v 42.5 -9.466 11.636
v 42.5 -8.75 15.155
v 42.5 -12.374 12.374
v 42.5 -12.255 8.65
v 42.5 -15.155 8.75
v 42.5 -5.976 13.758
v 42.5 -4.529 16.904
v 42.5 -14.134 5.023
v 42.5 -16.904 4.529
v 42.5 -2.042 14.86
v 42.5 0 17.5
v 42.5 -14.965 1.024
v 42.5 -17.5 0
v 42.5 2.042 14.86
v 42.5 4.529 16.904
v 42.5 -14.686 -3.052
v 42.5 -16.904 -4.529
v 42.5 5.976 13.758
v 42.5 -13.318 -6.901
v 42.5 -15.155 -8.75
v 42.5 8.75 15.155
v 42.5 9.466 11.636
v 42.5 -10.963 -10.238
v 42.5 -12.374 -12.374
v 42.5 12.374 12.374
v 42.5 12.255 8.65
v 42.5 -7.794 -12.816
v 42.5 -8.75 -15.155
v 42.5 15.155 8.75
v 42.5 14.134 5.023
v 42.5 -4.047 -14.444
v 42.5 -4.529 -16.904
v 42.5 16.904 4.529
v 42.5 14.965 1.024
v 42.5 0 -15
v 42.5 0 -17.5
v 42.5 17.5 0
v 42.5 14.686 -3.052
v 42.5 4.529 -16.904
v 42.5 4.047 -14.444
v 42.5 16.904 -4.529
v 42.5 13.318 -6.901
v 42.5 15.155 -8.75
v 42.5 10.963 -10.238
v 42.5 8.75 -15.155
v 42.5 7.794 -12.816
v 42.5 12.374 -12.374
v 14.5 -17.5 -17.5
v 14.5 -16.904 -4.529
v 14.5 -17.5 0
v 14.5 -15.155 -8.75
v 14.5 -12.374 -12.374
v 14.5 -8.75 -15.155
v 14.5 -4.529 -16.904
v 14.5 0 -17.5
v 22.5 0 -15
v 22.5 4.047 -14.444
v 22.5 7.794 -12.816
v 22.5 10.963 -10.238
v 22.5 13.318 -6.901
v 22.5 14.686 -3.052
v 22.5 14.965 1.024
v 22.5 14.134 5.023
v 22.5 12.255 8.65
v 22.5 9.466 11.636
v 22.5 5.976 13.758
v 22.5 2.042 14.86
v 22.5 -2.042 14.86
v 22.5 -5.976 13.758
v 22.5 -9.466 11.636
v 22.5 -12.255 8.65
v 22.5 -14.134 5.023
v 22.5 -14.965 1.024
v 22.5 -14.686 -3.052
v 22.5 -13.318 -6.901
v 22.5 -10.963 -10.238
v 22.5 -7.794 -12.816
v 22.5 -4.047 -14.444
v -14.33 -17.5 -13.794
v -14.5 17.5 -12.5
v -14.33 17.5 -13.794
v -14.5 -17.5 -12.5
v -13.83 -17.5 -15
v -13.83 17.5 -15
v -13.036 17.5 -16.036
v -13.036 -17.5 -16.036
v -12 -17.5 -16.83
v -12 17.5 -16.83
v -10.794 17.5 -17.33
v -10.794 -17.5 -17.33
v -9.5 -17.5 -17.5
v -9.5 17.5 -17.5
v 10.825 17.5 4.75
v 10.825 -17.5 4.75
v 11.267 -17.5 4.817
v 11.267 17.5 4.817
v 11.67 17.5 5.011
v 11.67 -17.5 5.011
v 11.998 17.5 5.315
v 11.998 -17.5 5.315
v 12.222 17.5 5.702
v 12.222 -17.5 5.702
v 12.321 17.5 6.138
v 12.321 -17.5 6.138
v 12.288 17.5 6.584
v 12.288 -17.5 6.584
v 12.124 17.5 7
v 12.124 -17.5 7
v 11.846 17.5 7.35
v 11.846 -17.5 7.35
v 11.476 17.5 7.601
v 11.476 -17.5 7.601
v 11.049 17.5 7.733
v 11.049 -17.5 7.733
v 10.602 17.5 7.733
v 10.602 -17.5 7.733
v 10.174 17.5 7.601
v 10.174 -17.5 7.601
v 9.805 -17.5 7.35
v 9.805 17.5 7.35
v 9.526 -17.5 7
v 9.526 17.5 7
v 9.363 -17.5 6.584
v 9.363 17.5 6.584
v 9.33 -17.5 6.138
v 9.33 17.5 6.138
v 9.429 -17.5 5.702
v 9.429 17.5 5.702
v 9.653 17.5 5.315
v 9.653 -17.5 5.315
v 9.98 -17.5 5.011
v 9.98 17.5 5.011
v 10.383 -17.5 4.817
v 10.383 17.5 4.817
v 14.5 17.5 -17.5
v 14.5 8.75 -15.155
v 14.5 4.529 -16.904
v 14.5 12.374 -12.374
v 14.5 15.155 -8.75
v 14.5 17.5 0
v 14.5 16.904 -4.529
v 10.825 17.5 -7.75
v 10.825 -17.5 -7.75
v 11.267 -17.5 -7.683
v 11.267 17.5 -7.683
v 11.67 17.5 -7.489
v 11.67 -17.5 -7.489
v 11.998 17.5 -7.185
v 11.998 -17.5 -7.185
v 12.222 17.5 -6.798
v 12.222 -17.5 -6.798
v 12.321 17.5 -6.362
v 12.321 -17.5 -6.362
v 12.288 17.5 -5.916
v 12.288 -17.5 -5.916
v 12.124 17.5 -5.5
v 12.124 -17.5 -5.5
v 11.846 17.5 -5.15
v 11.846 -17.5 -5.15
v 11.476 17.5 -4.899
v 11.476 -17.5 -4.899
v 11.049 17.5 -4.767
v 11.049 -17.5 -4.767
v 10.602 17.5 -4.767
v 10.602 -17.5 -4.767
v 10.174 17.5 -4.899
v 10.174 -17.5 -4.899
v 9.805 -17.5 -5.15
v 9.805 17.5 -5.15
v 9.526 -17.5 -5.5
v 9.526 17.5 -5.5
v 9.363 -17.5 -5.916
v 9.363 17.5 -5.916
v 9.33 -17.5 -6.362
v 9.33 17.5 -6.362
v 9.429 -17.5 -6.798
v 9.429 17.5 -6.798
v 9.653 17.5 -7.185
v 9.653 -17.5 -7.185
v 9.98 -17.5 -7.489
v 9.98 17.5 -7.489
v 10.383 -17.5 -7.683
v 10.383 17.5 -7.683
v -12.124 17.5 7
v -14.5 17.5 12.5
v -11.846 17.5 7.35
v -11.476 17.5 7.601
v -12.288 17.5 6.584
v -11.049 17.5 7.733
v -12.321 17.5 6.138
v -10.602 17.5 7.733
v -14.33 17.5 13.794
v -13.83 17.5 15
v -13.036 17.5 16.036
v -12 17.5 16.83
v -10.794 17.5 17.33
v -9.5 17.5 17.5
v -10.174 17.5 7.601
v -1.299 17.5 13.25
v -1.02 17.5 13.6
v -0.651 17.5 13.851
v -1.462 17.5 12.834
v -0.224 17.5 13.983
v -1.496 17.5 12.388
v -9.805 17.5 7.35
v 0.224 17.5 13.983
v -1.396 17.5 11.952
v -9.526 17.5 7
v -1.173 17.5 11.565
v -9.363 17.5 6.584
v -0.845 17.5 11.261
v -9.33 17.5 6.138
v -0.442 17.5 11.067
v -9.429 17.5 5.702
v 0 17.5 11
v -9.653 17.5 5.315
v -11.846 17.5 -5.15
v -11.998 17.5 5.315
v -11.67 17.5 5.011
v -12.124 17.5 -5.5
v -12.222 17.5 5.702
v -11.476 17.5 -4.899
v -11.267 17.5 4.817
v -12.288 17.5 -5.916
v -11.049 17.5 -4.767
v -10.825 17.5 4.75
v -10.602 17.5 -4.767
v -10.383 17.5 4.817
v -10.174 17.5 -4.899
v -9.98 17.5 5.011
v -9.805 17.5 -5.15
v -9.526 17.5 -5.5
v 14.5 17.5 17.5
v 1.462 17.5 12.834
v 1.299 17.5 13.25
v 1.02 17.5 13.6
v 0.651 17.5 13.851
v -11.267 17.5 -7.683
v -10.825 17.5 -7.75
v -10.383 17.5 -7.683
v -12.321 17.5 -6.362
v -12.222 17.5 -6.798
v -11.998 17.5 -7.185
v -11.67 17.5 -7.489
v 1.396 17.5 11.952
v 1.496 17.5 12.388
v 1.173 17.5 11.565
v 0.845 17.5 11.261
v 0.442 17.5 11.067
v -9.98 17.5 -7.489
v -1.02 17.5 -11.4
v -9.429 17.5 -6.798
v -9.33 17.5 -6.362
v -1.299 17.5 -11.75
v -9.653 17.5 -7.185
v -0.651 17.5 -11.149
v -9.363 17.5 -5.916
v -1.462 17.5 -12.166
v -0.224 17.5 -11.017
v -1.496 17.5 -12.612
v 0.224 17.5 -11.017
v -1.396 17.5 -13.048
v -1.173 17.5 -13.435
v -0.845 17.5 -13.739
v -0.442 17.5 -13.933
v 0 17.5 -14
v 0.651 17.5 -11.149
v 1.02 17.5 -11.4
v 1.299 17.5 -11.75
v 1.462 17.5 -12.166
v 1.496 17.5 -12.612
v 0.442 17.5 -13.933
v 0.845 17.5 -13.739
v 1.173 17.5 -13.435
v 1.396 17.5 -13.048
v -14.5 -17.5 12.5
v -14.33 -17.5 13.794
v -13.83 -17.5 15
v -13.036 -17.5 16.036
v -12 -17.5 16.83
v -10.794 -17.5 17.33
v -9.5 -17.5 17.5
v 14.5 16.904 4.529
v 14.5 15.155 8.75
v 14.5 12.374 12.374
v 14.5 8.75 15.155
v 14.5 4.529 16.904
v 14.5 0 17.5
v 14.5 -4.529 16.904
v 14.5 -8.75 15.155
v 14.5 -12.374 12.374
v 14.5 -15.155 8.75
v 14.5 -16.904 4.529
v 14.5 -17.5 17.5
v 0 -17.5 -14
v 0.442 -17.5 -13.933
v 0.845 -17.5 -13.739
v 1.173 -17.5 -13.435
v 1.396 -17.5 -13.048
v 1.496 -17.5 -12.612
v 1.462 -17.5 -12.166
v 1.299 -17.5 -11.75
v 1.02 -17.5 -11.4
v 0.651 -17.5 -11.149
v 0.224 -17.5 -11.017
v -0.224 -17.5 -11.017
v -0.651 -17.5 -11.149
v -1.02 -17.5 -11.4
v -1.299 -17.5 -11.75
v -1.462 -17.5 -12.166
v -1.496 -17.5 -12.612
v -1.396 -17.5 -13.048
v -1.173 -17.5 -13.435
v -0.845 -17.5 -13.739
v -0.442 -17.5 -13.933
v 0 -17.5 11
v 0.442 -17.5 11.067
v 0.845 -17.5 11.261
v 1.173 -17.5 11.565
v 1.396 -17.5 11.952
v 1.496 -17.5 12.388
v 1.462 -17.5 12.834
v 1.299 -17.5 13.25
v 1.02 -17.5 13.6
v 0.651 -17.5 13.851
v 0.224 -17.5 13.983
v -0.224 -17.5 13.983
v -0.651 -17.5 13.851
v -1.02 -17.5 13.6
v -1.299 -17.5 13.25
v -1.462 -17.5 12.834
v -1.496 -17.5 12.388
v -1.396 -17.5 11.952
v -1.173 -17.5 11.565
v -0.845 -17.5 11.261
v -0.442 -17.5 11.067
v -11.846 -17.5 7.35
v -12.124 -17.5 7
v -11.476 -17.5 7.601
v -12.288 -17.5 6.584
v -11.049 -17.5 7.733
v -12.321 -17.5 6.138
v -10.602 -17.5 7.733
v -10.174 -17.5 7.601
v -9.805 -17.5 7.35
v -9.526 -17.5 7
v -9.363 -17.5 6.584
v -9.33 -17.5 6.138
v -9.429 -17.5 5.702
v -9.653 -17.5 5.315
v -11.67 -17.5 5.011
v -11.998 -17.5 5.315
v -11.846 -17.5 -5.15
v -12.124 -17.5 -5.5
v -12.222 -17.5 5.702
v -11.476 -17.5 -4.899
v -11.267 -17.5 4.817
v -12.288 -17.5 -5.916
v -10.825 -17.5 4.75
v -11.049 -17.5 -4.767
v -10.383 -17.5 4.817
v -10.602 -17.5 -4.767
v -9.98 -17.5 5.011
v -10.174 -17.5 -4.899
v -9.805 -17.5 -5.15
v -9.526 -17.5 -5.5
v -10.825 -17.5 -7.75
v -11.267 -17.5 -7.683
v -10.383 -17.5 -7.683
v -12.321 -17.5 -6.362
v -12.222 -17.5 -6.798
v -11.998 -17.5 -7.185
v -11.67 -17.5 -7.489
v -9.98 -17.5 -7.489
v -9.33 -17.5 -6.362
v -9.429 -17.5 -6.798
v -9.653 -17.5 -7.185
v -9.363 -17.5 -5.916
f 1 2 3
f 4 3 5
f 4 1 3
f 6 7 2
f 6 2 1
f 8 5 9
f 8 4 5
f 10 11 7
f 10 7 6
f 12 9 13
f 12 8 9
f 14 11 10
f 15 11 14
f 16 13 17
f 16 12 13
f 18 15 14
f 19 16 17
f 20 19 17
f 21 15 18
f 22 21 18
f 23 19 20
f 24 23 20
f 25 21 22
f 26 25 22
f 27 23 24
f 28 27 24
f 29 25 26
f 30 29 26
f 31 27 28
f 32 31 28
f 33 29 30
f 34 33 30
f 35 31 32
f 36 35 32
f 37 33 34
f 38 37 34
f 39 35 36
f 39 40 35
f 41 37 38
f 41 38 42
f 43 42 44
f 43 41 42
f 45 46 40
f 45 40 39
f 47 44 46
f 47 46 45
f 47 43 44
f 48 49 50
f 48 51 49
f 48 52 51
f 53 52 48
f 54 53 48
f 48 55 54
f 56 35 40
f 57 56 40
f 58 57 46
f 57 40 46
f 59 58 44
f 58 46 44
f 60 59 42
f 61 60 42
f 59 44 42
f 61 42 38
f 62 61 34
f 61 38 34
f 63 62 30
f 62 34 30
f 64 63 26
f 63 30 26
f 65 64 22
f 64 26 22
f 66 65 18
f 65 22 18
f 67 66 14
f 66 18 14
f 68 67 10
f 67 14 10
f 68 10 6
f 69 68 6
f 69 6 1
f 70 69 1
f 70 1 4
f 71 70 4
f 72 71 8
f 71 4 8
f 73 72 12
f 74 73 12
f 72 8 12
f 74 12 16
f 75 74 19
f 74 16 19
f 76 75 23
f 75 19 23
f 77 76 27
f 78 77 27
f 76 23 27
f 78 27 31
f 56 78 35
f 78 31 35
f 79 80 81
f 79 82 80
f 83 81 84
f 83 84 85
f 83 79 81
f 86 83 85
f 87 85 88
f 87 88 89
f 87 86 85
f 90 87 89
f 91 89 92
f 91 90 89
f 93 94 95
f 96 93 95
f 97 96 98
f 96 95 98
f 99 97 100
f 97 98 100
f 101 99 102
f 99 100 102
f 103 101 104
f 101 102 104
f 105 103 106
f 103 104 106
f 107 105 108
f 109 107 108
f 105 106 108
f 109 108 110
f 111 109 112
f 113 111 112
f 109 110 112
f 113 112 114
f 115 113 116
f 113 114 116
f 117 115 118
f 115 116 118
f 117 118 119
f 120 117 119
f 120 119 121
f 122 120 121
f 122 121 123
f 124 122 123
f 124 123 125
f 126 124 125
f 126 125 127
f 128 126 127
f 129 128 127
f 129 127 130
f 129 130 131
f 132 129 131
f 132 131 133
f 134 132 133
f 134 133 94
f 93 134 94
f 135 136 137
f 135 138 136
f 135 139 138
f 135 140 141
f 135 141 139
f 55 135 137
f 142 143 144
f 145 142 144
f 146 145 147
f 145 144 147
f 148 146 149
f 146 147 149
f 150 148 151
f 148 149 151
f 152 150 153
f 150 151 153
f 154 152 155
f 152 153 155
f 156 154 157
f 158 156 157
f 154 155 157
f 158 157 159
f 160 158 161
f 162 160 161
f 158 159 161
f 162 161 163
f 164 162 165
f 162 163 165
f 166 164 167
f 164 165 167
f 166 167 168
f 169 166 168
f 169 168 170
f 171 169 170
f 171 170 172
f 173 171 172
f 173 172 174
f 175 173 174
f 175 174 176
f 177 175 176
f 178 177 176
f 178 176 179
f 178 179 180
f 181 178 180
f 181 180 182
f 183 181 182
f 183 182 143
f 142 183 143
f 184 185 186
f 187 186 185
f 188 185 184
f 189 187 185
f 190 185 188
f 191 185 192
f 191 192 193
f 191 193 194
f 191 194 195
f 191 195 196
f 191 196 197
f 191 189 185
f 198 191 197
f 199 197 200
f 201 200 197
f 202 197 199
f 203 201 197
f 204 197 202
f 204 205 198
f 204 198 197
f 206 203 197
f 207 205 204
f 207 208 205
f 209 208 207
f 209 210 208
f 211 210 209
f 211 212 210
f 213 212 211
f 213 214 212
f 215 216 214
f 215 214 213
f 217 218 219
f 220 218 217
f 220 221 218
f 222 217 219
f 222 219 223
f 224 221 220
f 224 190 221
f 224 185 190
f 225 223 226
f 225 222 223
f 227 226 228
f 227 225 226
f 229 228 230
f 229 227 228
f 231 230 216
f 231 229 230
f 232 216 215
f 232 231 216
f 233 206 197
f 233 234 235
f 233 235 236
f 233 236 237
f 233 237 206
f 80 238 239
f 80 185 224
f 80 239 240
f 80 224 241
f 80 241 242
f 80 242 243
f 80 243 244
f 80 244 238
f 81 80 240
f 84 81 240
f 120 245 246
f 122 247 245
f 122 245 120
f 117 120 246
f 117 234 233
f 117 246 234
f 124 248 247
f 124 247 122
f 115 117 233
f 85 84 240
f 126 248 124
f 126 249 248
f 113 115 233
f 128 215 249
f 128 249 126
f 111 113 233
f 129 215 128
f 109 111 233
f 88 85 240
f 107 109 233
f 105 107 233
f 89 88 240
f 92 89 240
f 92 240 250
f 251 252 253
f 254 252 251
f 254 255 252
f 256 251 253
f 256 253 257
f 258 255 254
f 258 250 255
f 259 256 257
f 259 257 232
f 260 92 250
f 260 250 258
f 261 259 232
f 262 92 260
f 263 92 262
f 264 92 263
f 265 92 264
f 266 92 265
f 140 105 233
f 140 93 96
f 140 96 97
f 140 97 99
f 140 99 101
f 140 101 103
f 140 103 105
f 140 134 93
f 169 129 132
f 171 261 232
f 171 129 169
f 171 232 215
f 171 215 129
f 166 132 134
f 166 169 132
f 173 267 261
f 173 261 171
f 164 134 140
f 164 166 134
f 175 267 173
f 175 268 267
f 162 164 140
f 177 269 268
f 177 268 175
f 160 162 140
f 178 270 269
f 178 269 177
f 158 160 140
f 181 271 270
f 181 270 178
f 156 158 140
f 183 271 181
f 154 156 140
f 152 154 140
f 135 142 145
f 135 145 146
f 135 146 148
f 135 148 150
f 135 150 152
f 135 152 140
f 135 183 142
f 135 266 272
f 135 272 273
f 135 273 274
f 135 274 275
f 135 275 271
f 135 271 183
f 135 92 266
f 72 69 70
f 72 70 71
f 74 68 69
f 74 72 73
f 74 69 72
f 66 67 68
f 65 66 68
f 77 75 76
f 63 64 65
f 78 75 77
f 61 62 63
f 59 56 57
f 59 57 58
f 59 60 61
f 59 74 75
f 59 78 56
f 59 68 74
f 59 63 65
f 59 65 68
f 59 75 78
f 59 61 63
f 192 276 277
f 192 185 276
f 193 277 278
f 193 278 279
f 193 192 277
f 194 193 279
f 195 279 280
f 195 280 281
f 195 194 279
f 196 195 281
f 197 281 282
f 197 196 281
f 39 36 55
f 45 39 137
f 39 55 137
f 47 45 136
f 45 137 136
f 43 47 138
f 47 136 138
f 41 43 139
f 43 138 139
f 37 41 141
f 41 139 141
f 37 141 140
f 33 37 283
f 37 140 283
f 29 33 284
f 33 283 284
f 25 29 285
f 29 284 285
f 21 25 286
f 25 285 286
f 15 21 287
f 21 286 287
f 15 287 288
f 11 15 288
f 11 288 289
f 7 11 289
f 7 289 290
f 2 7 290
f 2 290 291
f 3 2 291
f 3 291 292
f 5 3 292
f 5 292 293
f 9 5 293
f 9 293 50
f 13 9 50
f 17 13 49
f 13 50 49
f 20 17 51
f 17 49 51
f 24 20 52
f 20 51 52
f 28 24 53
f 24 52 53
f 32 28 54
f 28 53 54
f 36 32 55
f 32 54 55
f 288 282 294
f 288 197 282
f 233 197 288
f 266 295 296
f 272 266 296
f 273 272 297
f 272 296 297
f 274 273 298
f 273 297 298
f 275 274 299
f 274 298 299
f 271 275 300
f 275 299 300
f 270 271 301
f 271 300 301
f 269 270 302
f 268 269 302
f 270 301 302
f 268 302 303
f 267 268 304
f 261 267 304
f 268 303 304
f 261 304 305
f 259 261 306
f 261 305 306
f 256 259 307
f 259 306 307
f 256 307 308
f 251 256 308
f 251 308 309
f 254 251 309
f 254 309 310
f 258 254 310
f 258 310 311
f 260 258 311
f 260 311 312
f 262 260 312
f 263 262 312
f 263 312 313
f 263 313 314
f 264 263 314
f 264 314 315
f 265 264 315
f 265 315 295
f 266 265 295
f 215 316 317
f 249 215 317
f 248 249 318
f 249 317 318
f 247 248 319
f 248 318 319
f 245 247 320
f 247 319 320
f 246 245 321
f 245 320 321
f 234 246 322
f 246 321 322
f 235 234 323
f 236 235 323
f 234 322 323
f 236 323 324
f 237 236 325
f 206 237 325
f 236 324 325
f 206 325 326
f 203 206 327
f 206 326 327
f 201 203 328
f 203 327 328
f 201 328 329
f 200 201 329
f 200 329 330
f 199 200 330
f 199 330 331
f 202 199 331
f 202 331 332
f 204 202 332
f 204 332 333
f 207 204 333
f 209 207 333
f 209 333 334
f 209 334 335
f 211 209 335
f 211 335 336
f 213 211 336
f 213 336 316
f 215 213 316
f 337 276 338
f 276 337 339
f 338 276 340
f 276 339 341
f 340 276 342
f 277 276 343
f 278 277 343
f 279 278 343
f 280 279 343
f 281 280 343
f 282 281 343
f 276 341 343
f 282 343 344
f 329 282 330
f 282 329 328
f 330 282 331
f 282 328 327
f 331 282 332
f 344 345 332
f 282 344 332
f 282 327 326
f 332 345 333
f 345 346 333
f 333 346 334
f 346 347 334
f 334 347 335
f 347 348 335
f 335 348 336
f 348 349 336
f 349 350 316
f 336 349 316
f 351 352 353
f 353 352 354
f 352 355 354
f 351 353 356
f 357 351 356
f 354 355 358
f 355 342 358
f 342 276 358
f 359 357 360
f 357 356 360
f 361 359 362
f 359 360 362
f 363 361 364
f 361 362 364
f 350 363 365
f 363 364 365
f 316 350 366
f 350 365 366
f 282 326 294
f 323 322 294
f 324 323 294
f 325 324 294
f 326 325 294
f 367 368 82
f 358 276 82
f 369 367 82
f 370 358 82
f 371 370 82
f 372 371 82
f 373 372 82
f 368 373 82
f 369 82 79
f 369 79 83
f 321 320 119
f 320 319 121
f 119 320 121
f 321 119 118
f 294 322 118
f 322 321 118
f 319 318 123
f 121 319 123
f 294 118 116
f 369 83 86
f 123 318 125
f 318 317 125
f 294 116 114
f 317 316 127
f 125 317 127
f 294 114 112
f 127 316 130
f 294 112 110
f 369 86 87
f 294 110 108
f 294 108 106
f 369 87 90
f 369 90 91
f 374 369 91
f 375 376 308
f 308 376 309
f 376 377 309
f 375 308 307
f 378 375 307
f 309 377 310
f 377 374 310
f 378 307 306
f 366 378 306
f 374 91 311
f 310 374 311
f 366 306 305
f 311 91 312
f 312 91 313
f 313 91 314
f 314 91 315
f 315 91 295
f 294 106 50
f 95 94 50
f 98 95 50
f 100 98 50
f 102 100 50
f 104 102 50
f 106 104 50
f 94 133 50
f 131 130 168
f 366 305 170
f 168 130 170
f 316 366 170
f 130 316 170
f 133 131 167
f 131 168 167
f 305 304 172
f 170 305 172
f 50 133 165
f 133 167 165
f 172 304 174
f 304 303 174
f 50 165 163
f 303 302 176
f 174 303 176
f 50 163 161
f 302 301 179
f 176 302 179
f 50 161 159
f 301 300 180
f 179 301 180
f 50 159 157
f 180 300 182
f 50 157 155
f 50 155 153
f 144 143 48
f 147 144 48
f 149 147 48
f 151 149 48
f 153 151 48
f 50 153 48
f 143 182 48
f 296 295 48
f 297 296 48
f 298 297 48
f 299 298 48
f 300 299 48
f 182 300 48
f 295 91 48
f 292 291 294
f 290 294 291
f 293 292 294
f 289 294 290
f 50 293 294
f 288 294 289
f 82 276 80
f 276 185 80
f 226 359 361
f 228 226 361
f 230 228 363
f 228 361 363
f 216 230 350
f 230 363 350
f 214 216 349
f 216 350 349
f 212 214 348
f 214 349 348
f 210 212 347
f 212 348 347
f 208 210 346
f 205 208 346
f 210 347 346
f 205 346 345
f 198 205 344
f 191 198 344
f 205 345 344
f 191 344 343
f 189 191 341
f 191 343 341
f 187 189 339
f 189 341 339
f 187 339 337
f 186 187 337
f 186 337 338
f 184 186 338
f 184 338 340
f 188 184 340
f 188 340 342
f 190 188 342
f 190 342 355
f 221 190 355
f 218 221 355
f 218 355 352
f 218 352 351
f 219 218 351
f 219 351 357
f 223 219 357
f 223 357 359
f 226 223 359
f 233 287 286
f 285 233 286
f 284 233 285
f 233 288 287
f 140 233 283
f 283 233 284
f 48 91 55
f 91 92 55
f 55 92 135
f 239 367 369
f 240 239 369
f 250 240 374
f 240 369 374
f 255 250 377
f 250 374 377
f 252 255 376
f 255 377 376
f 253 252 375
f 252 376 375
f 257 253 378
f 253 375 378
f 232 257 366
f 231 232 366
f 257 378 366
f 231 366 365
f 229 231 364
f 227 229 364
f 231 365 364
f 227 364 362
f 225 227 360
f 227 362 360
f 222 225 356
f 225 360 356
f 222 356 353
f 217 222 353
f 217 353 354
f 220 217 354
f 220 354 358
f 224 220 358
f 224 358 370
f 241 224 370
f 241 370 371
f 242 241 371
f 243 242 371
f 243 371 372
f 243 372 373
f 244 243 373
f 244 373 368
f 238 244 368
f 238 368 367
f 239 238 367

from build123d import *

# Parameters (mm, degrees)
SKETCH1_W           = 29
SKETCH1_H           = 35
BOSS_EXTRUDE1_DEPTH = 17.5
FILLET1_R           = 5
SKETCH2_R           = 17.5
BOSS_EXTRUDE2_DEPTH = 28
SKETCH3_R           = 15
CUT_EXTRUDE1_DEPTH  = 20
CUT_EXTRUDE2_REACH  = 59.771
SKETCH4_R           = 1.5


with BuildPart() as part:
    # Sketch1 → Boss-Extrude1 (new, symmetric)
    with BuildSketch(Plane(origin=(0, 0, 0), x_dir=(1, 0, 0), z_dir=(0, 1, 0))):
        Rectangle(SKETCH1_W, SKETCH1_H)
    extrude(amount=BOSS_EXTRUDE1_DEPTH, both=True)

    # Fillet1
    fillet1_edges = [part.edges().sort_by_distance(p)[0] for p in [
        (-14.5, 0, 17.5),
        (-14.5, 0, -17.5),
    ]]
    fillet(fillet1_edges, radius=FILLET1_R)

    # Sketch2 → Boss-Extrude2 (add)
    with BuildSketch(Plane(origin=(14.5, 0, 0), x_dir=(0, 0, -1), z_dir=(1, 0, 0))):
        Circle(SKETCH2_R)
    extrude(amount=BOSS_EXTRUDE2_DEPTH)

    # Sketch3 → Cut-Extrude1 (cut)
    with BuildSketch(Plane(origin=(42.5, 0, 0), x_dir=(0, 0, -1), z_dir=(1, 0, 0))):
        Circle(SKETCH3_R)
    extrude(amount=-CUT_EXTRUDE1_DEPTH, mode=Mode.SUBTRACT)

    # Sketch4 → Cut-Extrude2 (cut, up to next)
    with BuildSketch(Plane.XZ.offset(17.5), mode=Mode.PRIVATE) as cut_extrude2_sk1:
        with Locations(Location((0, 12.5, 0), (0, 0, 270))):
            Circle(SKETCH4_R)
    cut_extrude2_tool1 = extrude(cut_extrude2_sk1.sketch, amount=-CUT_EXTRUDE2_REACH, mode=Mode.PRIVATE) & part.part
    # Sketch4 → Cut-Extrude2 (cut, up to next)
    with BuildSketch(Plane.XZ.offset(17.5), mode=Mode.PRIVATE) as cut_extrude2_sk2:
        with Locations(Location((10.825317547, 6.25, 0), (0, 0, 270))):
            Circle(SKETCH4_R)
    cut_extrude2_tool2 = extrude(cut_extrude2_sk2.sketch, amount=-CUT_EXTRUDE2_REACH, mode=Mode.PRIVATE) & part.part
    # Sketch4 → Cut-Extrude2 (cut, up to next)
    with BuildSketch(Plane.XZ.offset(17.5), mode=Mode.PRIVATE) as cut_extrude2_sk3:
        with Locations(Location((10.825317547, -6.25, 0), (0, 0, 270))):
            Circle(SKETCH4_R)
    cut_extrude2_tool3 = extrude(cut_extrude2_sk3.sketch, amount=-CUT_EXTRUDE2_REACH, mode=Mode.PRIVATE) & part.part
    # Sketch4 → Cut-Extrude2 (cut, up to next)
    with BuildSketch(Plane.XZ.offset(17.5), mode=Mode.PRIVATE) as cut_extrude2_sk4:
        with Locations(Location((0, -12.5, 0), (0, 0, 270))):
            Circle(SKETCH4_R)
    cut_extrude2_tool4 = extrude(cut_extrude2_sk4.sketch, amount=-CUT_EXTRUDE2_REACH, mode=Mode.PRIVATE) & part.part
    # Sketch4 → Cut-Extrude2 (cut, up to next)
    with BuildSketch(Plane.XZ.offset(17.5), mode=Mode.PRIVATE) as cut_extrude2_sk5:
        with Locations(Location((-10.825317547, -6.25, 0), (0, 0, 270))):
            Circle(SKETCH4_R)
    cut_extrude2_tool5 = extrude(cut_extrude2_sk5.sketch, amount=-CUT_EXTRUDE2_REACH, mode=Mode.PRIVATE) & part.part
    # Sketch4 → Cut-Extrude2 (cut, up to next)
    with BuildSketch(Plane.XZ.offset(17.5), mode=Mode.PRIVATE) as cut_extrude2_sk6:
        with Locations(Location((-10.825317547, 6.25, 0), (0, 0, 270))):
            Circle(SKETCH4_R)
    cut_extrude2_tool6 = extrude(cut_extrude2_sk6.sketch, amount=-CUT_EXTRUDE2_REACH, mode=Mode.PRIVATE) & part.part
    add(cut_extrude2_tool1.solids().sort_by_distance((0, -17.5, 12.5))[0], mode=Mode.SUBTRACT)
    add(cut_extrude2_tool2.solids().sort_by_distance((10.825318, -17.5, 6.25))[0], mode=Mode.SUBTRACT)
    add(cut_extrude2_tool3.solids().sort_by_distance((10.825318, -17.5, -6.25))[0], mode=Mode.SUBTRACT)
    add(cut_extrude2_tool4.solids().sort_by_distance((0, -17.5, -12.5))[0], mode=Mode.SUBTRACT)
    add(cut_extrude2_tool5.solids().sort_by_distance((-10.825318, -17.5, -6.25))[0], mode=Mode.SUBTRACT)
    add(cut_extrude2_tool6.solids().sort_by_distance((-10.825318, -17.5, 6.25))[0], mode=Mode.SUBTRACT)


solid = part.part
